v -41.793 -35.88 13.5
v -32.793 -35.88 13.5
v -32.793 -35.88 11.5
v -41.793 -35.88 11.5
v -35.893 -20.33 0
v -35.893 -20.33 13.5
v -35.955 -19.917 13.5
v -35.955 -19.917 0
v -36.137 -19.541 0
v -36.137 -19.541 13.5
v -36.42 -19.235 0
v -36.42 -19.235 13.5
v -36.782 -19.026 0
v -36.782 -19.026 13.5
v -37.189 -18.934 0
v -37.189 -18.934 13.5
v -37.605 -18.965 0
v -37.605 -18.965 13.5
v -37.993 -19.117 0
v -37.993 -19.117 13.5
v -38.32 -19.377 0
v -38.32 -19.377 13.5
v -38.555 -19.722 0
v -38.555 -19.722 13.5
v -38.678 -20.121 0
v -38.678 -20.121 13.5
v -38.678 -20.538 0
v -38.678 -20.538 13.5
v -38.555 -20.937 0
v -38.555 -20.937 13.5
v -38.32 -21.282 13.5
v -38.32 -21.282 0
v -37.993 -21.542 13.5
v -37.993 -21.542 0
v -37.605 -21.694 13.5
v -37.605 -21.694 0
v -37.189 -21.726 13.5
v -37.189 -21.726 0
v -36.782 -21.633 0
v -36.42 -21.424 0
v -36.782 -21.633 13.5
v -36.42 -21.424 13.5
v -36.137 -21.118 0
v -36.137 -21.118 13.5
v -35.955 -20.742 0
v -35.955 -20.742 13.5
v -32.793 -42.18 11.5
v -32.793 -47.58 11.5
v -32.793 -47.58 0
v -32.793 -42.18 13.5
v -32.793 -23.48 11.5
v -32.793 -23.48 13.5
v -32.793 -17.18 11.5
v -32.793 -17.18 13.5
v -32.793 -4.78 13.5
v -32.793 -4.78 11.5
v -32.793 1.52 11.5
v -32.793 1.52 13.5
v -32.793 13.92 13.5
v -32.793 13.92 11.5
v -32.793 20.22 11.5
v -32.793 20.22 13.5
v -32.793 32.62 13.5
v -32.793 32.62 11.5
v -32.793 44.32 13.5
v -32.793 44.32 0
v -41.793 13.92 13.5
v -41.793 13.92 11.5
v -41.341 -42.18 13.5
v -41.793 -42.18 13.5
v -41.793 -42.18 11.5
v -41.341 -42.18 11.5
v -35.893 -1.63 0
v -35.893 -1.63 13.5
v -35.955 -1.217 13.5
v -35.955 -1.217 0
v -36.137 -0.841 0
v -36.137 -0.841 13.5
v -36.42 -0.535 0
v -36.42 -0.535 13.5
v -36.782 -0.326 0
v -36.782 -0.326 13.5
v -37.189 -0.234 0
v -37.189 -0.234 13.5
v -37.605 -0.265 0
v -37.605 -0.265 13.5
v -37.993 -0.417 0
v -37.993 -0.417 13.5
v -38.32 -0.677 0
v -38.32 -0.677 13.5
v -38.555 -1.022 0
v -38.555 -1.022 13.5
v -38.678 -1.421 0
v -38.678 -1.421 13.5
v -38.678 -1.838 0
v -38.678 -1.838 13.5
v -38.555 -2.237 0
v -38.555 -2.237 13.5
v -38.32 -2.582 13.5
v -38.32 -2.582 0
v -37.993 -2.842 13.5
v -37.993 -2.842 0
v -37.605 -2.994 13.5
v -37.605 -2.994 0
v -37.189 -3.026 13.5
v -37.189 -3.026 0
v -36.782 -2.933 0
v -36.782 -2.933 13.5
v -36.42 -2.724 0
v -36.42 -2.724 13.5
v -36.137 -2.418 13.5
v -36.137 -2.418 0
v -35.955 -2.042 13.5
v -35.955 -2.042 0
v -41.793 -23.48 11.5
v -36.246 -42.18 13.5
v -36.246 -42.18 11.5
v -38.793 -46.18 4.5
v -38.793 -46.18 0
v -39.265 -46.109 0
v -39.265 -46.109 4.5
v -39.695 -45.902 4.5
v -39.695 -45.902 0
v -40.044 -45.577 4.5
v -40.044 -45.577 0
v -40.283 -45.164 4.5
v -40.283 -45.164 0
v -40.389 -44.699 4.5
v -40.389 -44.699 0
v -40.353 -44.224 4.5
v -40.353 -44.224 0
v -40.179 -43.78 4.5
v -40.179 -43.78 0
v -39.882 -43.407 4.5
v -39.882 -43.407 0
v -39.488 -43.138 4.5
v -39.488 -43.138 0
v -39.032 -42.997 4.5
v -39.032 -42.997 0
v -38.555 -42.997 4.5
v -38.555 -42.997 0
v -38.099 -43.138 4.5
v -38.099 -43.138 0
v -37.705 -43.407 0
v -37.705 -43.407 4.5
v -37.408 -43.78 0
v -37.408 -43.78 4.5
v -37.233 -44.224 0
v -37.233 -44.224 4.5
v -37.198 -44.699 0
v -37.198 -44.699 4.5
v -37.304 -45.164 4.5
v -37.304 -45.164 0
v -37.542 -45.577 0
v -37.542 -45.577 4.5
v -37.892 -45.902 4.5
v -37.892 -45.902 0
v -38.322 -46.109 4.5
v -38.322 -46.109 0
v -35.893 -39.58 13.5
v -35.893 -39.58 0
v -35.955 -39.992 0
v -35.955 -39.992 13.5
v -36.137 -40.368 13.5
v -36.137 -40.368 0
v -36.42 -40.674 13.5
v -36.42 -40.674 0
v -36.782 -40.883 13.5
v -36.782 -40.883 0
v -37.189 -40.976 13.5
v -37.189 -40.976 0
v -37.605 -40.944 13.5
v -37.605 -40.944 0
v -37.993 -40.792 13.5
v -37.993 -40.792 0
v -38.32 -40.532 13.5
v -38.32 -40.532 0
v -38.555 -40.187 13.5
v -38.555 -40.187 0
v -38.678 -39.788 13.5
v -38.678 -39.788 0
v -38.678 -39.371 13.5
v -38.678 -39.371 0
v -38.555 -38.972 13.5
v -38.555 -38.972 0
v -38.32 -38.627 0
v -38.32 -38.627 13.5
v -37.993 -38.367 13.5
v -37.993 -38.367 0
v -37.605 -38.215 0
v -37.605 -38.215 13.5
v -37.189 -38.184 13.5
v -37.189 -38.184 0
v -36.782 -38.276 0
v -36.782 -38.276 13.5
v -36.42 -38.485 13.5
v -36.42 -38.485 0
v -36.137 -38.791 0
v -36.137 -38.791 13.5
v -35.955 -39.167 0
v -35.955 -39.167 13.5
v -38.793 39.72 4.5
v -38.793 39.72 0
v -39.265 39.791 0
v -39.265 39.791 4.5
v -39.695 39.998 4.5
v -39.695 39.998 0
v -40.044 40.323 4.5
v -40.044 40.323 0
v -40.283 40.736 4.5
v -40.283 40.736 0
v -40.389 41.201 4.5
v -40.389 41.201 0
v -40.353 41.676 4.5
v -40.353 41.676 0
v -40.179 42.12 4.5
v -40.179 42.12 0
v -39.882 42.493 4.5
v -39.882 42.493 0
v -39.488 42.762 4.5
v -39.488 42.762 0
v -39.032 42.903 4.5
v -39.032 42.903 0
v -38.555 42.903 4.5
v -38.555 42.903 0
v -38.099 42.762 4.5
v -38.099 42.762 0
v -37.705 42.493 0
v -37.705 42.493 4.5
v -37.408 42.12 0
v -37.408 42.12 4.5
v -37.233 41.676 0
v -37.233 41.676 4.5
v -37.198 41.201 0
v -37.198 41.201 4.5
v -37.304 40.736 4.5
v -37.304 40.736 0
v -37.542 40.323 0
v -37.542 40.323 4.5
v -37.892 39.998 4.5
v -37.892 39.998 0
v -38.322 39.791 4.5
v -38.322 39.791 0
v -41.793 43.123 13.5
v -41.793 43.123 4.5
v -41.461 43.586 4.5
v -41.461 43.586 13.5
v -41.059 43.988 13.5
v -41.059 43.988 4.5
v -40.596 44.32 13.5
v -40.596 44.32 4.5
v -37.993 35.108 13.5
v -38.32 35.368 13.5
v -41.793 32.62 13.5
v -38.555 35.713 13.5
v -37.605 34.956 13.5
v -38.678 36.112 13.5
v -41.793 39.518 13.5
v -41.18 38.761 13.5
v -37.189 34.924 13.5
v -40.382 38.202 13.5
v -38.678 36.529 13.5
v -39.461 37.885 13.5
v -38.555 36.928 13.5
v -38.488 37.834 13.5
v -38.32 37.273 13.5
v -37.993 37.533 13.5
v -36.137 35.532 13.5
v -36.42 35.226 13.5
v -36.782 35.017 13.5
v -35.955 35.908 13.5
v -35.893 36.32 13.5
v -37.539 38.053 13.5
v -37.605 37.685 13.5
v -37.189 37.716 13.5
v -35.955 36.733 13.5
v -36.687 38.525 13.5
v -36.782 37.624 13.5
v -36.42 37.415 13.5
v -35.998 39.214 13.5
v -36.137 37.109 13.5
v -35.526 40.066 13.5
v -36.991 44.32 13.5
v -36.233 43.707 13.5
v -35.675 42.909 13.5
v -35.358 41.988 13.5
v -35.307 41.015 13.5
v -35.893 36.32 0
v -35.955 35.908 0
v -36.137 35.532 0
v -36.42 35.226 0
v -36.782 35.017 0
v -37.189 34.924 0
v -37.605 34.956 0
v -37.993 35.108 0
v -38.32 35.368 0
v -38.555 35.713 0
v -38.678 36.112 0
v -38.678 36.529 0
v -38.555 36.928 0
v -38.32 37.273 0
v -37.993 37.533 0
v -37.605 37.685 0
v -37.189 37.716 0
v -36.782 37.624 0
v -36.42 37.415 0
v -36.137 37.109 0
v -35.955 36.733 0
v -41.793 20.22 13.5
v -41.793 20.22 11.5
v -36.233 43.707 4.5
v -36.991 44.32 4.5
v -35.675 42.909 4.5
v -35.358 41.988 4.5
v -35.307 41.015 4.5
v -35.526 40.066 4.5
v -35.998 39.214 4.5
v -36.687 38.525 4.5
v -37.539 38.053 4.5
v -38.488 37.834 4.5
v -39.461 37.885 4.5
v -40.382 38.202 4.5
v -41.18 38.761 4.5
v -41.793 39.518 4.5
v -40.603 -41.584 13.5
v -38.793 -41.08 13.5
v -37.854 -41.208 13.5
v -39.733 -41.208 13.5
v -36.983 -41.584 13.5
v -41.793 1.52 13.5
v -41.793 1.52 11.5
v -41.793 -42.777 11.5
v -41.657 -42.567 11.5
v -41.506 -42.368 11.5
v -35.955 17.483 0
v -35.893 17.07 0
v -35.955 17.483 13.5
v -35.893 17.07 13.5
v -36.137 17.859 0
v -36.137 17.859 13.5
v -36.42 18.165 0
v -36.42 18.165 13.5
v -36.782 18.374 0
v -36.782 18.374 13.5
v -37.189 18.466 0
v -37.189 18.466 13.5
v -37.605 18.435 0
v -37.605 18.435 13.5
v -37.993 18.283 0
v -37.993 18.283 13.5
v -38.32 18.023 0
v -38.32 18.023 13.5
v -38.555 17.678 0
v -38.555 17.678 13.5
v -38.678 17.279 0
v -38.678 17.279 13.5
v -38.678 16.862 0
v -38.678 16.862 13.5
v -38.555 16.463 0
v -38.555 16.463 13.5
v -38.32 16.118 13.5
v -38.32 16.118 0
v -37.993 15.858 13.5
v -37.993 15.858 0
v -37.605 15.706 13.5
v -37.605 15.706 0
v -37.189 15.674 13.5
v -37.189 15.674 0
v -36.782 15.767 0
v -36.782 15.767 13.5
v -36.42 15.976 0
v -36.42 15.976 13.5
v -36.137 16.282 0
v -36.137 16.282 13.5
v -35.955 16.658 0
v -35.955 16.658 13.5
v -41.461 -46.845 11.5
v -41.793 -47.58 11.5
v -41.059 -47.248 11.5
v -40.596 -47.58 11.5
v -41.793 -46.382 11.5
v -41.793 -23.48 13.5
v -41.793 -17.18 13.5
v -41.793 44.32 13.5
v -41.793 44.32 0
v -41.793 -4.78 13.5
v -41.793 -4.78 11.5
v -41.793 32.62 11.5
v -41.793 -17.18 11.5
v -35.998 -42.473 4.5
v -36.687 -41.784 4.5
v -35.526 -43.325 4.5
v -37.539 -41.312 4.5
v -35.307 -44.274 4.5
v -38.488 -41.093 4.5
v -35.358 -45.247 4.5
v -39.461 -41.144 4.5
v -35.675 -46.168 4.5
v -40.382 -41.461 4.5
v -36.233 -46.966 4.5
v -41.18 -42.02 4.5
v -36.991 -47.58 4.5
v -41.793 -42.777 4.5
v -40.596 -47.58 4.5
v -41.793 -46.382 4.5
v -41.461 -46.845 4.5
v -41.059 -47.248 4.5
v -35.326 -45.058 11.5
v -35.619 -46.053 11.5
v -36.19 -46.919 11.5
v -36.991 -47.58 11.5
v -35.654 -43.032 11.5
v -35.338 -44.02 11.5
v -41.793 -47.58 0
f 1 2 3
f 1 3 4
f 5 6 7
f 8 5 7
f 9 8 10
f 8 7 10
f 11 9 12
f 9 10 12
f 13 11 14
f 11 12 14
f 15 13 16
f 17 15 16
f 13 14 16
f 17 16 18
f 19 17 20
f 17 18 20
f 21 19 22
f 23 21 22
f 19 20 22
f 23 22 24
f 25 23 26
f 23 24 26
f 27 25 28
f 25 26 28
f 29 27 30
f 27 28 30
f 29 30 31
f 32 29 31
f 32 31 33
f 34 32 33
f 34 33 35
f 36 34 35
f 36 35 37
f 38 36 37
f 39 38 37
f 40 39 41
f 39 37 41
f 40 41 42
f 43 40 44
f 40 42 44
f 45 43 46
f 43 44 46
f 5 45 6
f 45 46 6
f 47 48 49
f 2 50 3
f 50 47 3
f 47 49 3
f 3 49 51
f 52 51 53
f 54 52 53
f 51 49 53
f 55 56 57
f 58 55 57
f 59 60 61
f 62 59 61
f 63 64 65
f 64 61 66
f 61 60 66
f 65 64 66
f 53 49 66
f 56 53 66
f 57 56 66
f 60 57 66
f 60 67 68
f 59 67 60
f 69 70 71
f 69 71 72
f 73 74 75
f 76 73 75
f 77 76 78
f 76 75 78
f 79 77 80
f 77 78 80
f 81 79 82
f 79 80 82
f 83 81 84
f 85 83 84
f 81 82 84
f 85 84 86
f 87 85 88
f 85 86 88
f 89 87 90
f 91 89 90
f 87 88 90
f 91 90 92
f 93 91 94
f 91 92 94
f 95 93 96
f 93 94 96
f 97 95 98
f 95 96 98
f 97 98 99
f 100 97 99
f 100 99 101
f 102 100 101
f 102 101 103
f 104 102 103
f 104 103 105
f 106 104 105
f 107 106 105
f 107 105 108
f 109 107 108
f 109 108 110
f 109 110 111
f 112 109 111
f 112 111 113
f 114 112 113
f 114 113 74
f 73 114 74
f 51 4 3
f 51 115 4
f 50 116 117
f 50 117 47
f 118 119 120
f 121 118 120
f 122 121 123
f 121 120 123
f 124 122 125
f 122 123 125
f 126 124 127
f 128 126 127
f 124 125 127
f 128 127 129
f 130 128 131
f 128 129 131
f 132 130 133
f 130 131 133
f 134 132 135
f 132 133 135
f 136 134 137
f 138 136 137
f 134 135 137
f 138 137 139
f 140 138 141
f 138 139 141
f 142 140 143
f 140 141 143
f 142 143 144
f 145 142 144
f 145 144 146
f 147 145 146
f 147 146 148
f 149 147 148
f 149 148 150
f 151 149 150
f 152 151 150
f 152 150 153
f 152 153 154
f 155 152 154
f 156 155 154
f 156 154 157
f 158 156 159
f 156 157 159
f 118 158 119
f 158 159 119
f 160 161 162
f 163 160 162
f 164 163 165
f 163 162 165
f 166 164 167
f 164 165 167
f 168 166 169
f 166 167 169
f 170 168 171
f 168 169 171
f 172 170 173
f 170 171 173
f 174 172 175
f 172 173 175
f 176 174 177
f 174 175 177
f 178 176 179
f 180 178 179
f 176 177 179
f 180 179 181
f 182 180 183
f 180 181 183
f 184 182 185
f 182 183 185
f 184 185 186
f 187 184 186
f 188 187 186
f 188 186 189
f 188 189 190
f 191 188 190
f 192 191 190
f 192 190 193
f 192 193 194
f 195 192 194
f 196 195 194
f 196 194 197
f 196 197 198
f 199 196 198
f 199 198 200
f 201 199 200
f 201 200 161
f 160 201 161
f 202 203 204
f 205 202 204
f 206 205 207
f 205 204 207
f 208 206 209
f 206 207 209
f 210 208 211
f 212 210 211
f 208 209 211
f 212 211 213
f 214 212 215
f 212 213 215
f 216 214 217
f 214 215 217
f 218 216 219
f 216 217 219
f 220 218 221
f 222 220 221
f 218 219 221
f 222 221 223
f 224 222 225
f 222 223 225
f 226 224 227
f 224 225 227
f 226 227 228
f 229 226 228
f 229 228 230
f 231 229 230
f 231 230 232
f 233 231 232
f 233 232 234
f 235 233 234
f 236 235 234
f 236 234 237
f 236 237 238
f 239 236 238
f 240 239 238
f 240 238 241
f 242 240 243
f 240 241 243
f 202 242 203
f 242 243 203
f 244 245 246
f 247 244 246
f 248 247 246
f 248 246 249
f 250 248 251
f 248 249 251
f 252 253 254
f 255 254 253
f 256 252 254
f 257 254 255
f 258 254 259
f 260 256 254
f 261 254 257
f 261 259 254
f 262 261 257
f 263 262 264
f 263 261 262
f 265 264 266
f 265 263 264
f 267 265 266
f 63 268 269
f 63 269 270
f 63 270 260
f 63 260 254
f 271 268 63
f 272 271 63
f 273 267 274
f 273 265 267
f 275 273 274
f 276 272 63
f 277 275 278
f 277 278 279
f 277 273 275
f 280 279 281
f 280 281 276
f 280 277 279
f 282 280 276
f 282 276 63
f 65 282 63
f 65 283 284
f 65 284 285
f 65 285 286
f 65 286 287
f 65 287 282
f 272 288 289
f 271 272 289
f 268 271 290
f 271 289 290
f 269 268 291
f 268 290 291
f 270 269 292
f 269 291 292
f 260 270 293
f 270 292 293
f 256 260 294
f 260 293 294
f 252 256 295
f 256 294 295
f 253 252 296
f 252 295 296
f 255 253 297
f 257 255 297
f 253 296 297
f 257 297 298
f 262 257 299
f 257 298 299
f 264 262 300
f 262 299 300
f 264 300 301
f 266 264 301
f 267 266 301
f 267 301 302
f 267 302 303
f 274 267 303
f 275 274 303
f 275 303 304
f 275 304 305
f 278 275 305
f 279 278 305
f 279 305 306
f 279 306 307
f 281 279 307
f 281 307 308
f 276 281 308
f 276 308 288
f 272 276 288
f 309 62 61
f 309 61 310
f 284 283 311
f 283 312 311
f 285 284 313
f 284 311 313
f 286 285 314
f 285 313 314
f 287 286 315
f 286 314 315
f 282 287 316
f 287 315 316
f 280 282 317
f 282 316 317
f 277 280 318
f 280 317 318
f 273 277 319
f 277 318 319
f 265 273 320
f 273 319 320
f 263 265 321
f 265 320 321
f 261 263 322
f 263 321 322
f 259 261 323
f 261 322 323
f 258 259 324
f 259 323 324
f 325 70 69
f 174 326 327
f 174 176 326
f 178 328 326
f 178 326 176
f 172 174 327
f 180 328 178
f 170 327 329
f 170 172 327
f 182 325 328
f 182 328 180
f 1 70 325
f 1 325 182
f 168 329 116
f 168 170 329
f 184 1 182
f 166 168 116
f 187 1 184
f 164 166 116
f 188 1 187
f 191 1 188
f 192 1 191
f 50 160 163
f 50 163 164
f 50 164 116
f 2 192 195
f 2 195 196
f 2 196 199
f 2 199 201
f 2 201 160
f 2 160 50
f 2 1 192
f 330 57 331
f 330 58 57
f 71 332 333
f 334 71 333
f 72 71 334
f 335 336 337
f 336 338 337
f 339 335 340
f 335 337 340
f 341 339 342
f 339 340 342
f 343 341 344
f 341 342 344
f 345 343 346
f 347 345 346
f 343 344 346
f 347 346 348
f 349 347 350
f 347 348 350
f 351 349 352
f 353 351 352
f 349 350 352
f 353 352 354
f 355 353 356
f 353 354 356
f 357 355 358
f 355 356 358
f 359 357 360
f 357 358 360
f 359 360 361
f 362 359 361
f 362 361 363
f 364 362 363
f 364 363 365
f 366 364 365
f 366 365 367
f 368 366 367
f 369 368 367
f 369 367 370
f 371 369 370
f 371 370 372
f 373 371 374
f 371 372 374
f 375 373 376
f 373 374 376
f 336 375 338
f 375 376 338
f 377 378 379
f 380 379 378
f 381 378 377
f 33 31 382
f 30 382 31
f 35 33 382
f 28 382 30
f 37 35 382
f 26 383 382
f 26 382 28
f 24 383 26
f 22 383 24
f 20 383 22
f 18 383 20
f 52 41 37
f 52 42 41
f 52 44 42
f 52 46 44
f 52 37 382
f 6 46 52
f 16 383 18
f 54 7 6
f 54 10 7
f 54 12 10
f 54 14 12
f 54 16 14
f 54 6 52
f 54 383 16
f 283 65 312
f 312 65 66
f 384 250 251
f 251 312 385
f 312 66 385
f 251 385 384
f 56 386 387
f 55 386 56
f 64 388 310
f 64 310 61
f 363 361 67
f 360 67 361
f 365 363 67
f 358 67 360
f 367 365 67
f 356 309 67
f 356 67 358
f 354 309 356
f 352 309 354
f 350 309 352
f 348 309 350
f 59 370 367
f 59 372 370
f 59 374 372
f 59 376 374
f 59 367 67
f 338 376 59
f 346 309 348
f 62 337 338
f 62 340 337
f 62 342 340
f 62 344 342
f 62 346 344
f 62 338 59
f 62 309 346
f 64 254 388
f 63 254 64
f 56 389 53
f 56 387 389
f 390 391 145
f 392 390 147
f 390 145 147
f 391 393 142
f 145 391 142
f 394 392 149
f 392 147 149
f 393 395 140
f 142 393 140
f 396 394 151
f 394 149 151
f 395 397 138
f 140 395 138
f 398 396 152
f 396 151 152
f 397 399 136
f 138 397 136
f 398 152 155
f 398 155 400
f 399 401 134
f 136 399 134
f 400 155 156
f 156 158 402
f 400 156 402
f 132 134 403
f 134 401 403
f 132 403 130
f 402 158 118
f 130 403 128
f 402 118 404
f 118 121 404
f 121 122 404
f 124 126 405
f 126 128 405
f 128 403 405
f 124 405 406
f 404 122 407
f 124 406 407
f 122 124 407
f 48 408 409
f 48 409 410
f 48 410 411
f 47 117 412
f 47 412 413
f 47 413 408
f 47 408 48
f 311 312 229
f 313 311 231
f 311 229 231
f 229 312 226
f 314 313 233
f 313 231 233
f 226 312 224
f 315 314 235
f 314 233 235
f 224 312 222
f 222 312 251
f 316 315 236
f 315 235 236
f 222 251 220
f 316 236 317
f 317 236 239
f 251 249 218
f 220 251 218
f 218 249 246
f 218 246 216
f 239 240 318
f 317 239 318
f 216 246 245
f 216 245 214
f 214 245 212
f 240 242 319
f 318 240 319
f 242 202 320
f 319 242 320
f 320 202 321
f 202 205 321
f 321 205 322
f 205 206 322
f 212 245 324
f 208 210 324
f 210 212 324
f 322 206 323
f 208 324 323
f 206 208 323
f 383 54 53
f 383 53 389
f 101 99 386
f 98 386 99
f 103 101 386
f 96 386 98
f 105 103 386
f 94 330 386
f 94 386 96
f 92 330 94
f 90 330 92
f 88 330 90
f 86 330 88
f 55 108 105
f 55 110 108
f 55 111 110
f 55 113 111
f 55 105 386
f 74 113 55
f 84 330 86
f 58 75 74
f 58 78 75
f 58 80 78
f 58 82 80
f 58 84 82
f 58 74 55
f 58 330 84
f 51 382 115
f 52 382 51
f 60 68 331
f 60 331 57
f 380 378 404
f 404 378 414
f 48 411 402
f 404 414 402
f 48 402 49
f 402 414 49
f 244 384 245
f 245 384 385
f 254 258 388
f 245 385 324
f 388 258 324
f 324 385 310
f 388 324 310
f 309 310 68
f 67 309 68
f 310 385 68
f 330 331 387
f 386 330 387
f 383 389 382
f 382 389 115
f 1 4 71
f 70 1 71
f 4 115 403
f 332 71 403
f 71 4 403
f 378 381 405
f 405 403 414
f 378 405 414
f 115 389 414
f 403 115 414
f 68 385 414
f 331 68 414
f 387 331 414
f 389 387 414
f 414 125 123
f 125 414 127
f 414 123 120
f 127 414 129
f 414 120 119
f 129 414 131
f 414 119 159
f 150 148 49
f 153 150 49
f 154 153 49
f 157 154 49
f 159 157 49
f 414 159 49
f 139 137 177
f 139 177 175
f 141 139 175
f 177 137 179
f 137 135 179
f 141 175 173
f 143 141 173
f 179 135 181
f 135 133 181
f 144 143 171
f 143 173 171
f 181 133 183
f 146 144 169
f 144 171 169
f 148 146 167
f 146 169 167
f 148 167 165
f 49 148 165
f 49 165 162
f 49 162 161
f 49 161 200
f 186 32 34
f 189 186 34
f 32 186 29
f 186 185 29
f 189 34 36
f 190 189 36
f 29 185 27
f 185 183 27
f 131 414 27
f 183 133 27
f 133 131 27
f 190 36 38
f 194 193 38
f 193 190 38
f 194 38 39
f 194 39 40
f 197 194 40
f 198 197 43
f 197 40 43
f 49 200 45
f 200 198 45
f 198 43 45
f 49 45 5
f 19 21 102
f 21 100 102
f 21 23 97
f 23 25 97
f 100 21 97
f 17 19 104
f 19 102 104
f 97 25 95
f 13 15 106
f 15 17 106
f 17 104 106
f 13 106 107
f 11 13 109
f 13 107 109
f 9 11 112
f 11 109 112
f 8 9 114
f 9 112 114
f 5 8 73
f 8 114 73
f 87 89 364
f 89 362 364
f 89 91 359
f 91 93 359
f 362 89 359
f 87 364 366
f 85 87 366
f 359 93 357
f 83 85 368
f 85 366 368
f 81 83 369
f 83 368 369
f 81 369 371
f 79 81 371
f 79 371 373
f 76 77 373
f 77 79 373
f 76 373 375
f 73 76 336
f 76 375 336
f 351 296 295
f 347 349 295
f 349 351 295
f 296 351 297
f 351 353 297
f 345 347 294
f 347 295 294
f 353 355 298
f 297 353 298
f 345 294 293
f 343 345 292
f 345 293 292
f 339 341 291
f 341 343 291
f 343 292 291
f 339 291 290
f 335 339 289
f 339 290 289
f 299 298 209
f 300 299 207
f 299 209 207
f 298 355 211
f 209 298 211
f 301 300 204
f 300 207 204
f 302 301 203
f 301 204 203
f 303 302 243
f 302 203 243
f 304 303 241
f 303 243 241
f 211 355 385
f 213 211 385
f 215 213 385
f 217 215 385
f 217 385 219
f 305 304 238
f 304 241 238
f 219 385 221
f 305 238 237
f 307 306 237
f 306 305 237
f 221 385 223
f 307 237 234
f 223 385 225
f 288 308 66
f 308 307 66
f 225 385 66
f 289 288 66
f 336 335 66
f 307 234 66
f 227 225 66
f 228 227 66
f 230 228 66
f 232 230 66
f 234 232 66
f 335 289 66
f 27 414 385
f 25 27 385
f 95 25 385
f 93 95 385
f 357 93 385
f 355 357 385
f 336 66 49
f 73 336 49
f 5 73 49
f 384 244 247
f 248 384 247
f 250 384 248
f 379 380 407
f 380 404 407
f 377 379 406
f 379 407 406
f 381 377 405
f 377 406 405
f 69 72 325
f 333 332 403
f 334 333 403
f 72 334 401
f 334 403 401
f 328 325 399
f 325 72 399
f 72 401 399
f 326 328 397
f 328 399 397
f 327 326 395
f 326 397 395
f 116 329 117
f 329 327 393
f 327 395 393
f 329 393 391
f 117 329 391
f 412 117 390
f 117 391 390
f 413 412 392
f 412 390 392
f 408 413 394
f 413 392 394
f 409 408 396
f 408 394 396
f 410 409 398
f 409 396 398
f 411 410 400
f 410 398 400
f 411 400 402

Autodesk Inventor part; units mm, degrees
ref_plane "YZ Plane" through (0, 0, 0) normal (1, 0, 0) x (0, 1, 0)
ref_plane "XZ Plane" through (0, 0, 0) normal (0, 1, 0) x (-1, 0, 0)
ref_plane "Arbeitsebene1" through (0, 0, 0) normal (0, 0, 1) x (1, 0, 0)
sketch "Skizze1" plane through (0, 0, 0) normal (0, 0, 1) x (1, 0, 0)
  line L0 (-69.421, 36.3204) -> (-72.421, 39.3204) projected
  line L1 (-69.421, 36.3204) -> (-60.421, 36.3204) projected
  line L2 (-57.421, 33.3204) -> (-60.421, 36.3204) projected
  line L3 (-57.421, 33.3204) -> (-57.421, -36.5796) projected
  line L4 (-60.421, -39.5796) -> (-57.421, -36.5796) projected
  line L5 (-60.421, -39.5796) -> (-69.421, -39.5796) projected
  line L6 (-72.421, -42.5796) -> (-69.421, -39.5796) projected
  line L7 (-72.421, -42.5796) -> (-72.421, -47.4152) projected
  arc A0 (-72.421, -47.4152) -> (-68.421, -51.4152) centre (-68.421, -47.4152) ccw projected
  line L8 (-68.421, -51.4152) -> (68.421, -51.4152) projected
  arc A1 (68.421, -51.4152) -> (72.421, -47.4152) centre (68.421, -47.4152) ccw projected
  line L9 (72.421, -47.4152) -> (72.421, -42.5796) projected
  line L10 (69.421, -39.5796) -> (72.421, -42.5796) projected
  line L11 (69.421, -39.5796) -> (65.421, -39.5796) projected
  line L12 (62.421, -36.5796) -> (65.421, -39.5796) projected
  line L13 (62.421, -36.5796) -> (62.421, 33.3204) projected
  line L14 (65.421, 36.3204) -> (62.421, 33.3204) projected
  line L15 (65.421, 36.3204) -> (69.421, 36.3204) projected
  line L16 (72.421, 39.3204) -> (69.421, 36.3204) projected
  line L17 (72.421, 39.3204) -> (72.421, 47.4152) projected
  arc A2 (72.421, 47.4152) -> (68.421, 51.4152) centre (68.421, 47.4152) ccw projected
  line L18 (68.421, 51.4152) -> (-68.421, 51.4152) projected
  arc A3 (-68.421, 51.4152) -> (-72.421, 47.4152) centre (-68.421, 47.4152) ccw projected
  line L19 (-72.421, 47.4152) -> (-72.421, 39.3204) projected
  circle A4 centre (68.921, 47.9152) radius 1.4 projected
  circle A5 centre (68.921, -47.9152) radius 1.4 projected
  circle A6 centre (-68.921, -47.9152) radius 1.4 projected
  circle A7 centre (-68.921, 47.9152) radius 1.5 projected
  circle A8 centre (-38.7933, -44.5796) radius 1.4 projected
  circle A9 centre (-38.7933, 41.3204) radius 1.4 projected
  line L20 (-48.1034, 36.3204) -> (-38.1034, 36.3204) projected
  line L21 (-38.1034, 36.3204) -> (-38.1034, -39.5796) projected
  line L22 (-38.1034, -39.5796) -> (-48.1034, -39.5796) projected
  line L23 (-48.1034, -39.5796) -> (-48.1034, 36.3204) projected
  circle A10 centre (-20.0933, 41.3204) radius 1.4 projected
  circle A11 centre (-20.0933, -44.5796) radius 1.4 projected
  line L24 (-19.4034, -39.5796) -> (-29.4034, -39.5796) projected
  line L25 (-29.4034, -39.5796) -> (-29.4034, 36.3204) projected
  line L26 (-29.4034, 36.3204) -> (-19.4034, 36.3204) projected
  line L27 (-19.4034, 36.3204) -> (-19.4034, -39.5796) projected
  circle A12 centre (-1.3933, 41.3204) radius 1.4 projected
  circle A13 centre (-1.3933, -44.5796) radius 1.4 projected
  line L28 (-0.7034, -39.5796) -> (-10.7034, -39.5796) projected
  line L29 (-10.7034, -39.5796) -> (-10.7034, 36.3204) projected
  line L30 (-10.7034, 36.3204) -> (-0.7034, 36.3204) projected
  line L31 (-0.7034, 36.3204) -> (-0.7034, -39.5796) projected
  circle A14 centre (17.3067, 41.3204) radius 1.4 projected
  circle A15 centre (17.3067, -44.5796) radius 1.4 projected
  line L32 (17.9966, -39.5796) -> (7.9966, -39.5796) projected
  line L33 (7.9966, -39.5796) -> (7.9966, 36.3204) projected
  line L34 (7.9966, 36.3204) -> (17.9966, 36.3204) projected
  line L35 (17.9966, 36.3204) -> (17.9966, -39.5796) projected
  circle A16 centre (36.0067, 41.3204) radius 1.4 projected
  circle A17 centre (36.0067, -44.5796) radius 1.4 projected
  line L36 (36.6966, -39.5796) -> (26.6966, -39.5796) projected
  line L37 (26.6966, -39.5796) -> (26.6966, 36.3204) projected
  line L38 (26.6966, 36.3204) -> (36.6966, 36.3204) projected
  line L39 (36.6966, 36.3204) -> (36.6966, -39.5796) projected
  circle A18 centre (54.7067, 41.3204) radius 1.4 projected
  circle A19 centre (54.7067, -44.5796) radius 1.4 projected
  line L40 (55.3966, -39.5796) -> (45.3966, -39.5796) projected
  line L41 (45.3966, -39.5796) -> (45.3966, 36.3204) projected
  line L42 (45.3966, 36.3204) -> (55.3966, 36.3204) projected
  line L43 (55.3966, 36.3204) -> (55.3966, -39.5796) projected
  line L44 (-32.7933, 44.3204) -> (-41.7933, 44.3204)
  line L45 (-41.7933, 44.3204) -> (-41.7933, -47.5796)
  line L46 (-41.7933, -47.5796) -> (-32.7933, -47.5796)
  line L47 (-32.7933, -47.5796) -> (-32.7933, 44.3204)
  circle A20 centre (-37.2933, 36.3204) radius 1.4
  circle A21 centre (-37.2933, -39.5796) radius 1.4
  point P0 (0, 0)
  dimension "d0" = 3
  dimension "d1" = 3
  dimension "d2" = 3
  dimension "d3" = 6
  dimension "d4" = 2.8
  dimension "d5" = 2.8
ref_plane "Arbeitsebene2" through (-44.2034, 20.4204, 13.5) normal (0, 0, -1) x (0, 1, 0)
extrude "Extrusion1" add sketch "Skizze1" along normal up to surface (13.5 mm away) contours L45 L44 L47 L46 L22 A21 L21 A20 L20 | L20 A20 L21 A21 L22 L45
sketch "Skizze2" plane through (-41.7933, -47.5796, 13.5) normal (0, 0, 1) x (1, 0, 0)
  line L0 (9, 68) -> (-3, 68) projected
  line L1 (-3, 80) -> (9, 80) projected
  line L2 (-3, 61.3) -> (9, 61.3) projected
  line L3 (9, 49.3) -> (-3, 49.3) projected
  line L4 (-3, 42.6) -> (9, 42.6) projected
  line L5 (9, 30.6) -> (-3, 30.6) projected
  line L6 (-3, 23.9) -> (9, 23.9) projected
  line L7 (9, 11.9) -> (-3, 11.9) projected
  line L8 (9, 80) -> (-3, 80)
  line L9 (-3, 80) -> (-3, 68)
  line L10 (-3, 68) -> (9, 68)
  line L11 (9, 68) -> (9, 80)
  line L12 (-3.2, 67.8) -> (-3.2, 80.2)
  line L13 (-3.2, 80.2) -> (9.2, 80.2)
  line L14 (9.2, 80.2) -> (9.2, 67.8)
  line L15 (9.2, 67.8) -> (-3.2, 67.8)
  point P0 (41.7933, 47.5796)
  dimension "d8" = 0.2
extrude "Extrusion2" cut sketch "Skizze2" against normal blind 2 contours L0 L9 L1 L11 | L12 L13 L14 L15
pattern_linear "Rechteckige Anordnung1" count 5 spacing 18.7 along (0, -1, 0) of "Extrusion2"
sketch "Skizze3" plane through (-41.7933, 20.2204, 13.5) normal (0, 0, 1) x (1, 0, 0)
  line L0 (0, -6.3) -> (9, -6.3) projected
  line L1 (9, -6.3) -> (9, 0) projected
  line L2 (9, 0) -> (0, 0) projected
  line L3 (0, 0) -> (0, -6.3) projected
  line L4 (0, -25) -> (9, -25) projected
  line L5 (9, -25) -> (9, -18.7) projected
  line L6 (9, -18.7) -> (0, -18.7) projected
  line L7 (0, -18.7) -> (0, -25) projected
  line L8 (0, -43.7) -> (9, -43.7) projected
  line L9 (9, -43.7) -> (9, -37.4) projected
  line L10 (9, -37.4) -> (0, -37.4) projected
  line L11 (0, -37.4) -> (0, -43.7) projected
  circle A0 centre (4.5, -3.15) radius 1.4
  circle A1 centre (4.5, -21.85) radius 1.4
  circle A2 centre (4.5, -40.55) radius 1.4
  point P0 (41.7933, -20.2204)
  dimension "d14" = 2.8
  dimension "d15" = 2.8
  dimension "d16" = 2.8
extrude "Extrusion3" cut sketch "Skizze3" against normal through all contours A0 | A1 | A2
sketch "Skizze4" plane through (-41.7933, -42.1796, 13.5) normal (0, 0, 1) x (1, 0, 0)
  circle A0 centre (3, 83.5) radius 1.4 projected
  circle A1 centre (4.5, 78.5) radius 1.4 projected
  line L0 (0, 74.8) -> (9, 74.8) projected
  line L1 (9, 74.8) -> (9, 86.5) projected
  line L2 (9, 86.5) -> (0, 86.5) projected
  line L3 (0, 86.5) -> (0, 74.8) projected
  line L4 (9, 0) -> (9, -5.4) projected
  line L5 (0, 0) -> (9, 0) projected
  line L6 (0, -5.4) -> (0, 0) projected
  line L7 (9, -5.4) -> (0, -5.4) projected
  circle A2 centre (3, -2.4) radius 1.4 projected
  point P0 (41.7933, 42.1796)
hole "Bohrung1" at (-38.7933, 41.3204, 13.5) at (-38.7933, -44.5796, 13.5) direction (0, 0, -1) diameter 3.2 end through all counterbore diameter 7 counterbore depth 9
properties part number "Omniscope_USBC_Bar"
